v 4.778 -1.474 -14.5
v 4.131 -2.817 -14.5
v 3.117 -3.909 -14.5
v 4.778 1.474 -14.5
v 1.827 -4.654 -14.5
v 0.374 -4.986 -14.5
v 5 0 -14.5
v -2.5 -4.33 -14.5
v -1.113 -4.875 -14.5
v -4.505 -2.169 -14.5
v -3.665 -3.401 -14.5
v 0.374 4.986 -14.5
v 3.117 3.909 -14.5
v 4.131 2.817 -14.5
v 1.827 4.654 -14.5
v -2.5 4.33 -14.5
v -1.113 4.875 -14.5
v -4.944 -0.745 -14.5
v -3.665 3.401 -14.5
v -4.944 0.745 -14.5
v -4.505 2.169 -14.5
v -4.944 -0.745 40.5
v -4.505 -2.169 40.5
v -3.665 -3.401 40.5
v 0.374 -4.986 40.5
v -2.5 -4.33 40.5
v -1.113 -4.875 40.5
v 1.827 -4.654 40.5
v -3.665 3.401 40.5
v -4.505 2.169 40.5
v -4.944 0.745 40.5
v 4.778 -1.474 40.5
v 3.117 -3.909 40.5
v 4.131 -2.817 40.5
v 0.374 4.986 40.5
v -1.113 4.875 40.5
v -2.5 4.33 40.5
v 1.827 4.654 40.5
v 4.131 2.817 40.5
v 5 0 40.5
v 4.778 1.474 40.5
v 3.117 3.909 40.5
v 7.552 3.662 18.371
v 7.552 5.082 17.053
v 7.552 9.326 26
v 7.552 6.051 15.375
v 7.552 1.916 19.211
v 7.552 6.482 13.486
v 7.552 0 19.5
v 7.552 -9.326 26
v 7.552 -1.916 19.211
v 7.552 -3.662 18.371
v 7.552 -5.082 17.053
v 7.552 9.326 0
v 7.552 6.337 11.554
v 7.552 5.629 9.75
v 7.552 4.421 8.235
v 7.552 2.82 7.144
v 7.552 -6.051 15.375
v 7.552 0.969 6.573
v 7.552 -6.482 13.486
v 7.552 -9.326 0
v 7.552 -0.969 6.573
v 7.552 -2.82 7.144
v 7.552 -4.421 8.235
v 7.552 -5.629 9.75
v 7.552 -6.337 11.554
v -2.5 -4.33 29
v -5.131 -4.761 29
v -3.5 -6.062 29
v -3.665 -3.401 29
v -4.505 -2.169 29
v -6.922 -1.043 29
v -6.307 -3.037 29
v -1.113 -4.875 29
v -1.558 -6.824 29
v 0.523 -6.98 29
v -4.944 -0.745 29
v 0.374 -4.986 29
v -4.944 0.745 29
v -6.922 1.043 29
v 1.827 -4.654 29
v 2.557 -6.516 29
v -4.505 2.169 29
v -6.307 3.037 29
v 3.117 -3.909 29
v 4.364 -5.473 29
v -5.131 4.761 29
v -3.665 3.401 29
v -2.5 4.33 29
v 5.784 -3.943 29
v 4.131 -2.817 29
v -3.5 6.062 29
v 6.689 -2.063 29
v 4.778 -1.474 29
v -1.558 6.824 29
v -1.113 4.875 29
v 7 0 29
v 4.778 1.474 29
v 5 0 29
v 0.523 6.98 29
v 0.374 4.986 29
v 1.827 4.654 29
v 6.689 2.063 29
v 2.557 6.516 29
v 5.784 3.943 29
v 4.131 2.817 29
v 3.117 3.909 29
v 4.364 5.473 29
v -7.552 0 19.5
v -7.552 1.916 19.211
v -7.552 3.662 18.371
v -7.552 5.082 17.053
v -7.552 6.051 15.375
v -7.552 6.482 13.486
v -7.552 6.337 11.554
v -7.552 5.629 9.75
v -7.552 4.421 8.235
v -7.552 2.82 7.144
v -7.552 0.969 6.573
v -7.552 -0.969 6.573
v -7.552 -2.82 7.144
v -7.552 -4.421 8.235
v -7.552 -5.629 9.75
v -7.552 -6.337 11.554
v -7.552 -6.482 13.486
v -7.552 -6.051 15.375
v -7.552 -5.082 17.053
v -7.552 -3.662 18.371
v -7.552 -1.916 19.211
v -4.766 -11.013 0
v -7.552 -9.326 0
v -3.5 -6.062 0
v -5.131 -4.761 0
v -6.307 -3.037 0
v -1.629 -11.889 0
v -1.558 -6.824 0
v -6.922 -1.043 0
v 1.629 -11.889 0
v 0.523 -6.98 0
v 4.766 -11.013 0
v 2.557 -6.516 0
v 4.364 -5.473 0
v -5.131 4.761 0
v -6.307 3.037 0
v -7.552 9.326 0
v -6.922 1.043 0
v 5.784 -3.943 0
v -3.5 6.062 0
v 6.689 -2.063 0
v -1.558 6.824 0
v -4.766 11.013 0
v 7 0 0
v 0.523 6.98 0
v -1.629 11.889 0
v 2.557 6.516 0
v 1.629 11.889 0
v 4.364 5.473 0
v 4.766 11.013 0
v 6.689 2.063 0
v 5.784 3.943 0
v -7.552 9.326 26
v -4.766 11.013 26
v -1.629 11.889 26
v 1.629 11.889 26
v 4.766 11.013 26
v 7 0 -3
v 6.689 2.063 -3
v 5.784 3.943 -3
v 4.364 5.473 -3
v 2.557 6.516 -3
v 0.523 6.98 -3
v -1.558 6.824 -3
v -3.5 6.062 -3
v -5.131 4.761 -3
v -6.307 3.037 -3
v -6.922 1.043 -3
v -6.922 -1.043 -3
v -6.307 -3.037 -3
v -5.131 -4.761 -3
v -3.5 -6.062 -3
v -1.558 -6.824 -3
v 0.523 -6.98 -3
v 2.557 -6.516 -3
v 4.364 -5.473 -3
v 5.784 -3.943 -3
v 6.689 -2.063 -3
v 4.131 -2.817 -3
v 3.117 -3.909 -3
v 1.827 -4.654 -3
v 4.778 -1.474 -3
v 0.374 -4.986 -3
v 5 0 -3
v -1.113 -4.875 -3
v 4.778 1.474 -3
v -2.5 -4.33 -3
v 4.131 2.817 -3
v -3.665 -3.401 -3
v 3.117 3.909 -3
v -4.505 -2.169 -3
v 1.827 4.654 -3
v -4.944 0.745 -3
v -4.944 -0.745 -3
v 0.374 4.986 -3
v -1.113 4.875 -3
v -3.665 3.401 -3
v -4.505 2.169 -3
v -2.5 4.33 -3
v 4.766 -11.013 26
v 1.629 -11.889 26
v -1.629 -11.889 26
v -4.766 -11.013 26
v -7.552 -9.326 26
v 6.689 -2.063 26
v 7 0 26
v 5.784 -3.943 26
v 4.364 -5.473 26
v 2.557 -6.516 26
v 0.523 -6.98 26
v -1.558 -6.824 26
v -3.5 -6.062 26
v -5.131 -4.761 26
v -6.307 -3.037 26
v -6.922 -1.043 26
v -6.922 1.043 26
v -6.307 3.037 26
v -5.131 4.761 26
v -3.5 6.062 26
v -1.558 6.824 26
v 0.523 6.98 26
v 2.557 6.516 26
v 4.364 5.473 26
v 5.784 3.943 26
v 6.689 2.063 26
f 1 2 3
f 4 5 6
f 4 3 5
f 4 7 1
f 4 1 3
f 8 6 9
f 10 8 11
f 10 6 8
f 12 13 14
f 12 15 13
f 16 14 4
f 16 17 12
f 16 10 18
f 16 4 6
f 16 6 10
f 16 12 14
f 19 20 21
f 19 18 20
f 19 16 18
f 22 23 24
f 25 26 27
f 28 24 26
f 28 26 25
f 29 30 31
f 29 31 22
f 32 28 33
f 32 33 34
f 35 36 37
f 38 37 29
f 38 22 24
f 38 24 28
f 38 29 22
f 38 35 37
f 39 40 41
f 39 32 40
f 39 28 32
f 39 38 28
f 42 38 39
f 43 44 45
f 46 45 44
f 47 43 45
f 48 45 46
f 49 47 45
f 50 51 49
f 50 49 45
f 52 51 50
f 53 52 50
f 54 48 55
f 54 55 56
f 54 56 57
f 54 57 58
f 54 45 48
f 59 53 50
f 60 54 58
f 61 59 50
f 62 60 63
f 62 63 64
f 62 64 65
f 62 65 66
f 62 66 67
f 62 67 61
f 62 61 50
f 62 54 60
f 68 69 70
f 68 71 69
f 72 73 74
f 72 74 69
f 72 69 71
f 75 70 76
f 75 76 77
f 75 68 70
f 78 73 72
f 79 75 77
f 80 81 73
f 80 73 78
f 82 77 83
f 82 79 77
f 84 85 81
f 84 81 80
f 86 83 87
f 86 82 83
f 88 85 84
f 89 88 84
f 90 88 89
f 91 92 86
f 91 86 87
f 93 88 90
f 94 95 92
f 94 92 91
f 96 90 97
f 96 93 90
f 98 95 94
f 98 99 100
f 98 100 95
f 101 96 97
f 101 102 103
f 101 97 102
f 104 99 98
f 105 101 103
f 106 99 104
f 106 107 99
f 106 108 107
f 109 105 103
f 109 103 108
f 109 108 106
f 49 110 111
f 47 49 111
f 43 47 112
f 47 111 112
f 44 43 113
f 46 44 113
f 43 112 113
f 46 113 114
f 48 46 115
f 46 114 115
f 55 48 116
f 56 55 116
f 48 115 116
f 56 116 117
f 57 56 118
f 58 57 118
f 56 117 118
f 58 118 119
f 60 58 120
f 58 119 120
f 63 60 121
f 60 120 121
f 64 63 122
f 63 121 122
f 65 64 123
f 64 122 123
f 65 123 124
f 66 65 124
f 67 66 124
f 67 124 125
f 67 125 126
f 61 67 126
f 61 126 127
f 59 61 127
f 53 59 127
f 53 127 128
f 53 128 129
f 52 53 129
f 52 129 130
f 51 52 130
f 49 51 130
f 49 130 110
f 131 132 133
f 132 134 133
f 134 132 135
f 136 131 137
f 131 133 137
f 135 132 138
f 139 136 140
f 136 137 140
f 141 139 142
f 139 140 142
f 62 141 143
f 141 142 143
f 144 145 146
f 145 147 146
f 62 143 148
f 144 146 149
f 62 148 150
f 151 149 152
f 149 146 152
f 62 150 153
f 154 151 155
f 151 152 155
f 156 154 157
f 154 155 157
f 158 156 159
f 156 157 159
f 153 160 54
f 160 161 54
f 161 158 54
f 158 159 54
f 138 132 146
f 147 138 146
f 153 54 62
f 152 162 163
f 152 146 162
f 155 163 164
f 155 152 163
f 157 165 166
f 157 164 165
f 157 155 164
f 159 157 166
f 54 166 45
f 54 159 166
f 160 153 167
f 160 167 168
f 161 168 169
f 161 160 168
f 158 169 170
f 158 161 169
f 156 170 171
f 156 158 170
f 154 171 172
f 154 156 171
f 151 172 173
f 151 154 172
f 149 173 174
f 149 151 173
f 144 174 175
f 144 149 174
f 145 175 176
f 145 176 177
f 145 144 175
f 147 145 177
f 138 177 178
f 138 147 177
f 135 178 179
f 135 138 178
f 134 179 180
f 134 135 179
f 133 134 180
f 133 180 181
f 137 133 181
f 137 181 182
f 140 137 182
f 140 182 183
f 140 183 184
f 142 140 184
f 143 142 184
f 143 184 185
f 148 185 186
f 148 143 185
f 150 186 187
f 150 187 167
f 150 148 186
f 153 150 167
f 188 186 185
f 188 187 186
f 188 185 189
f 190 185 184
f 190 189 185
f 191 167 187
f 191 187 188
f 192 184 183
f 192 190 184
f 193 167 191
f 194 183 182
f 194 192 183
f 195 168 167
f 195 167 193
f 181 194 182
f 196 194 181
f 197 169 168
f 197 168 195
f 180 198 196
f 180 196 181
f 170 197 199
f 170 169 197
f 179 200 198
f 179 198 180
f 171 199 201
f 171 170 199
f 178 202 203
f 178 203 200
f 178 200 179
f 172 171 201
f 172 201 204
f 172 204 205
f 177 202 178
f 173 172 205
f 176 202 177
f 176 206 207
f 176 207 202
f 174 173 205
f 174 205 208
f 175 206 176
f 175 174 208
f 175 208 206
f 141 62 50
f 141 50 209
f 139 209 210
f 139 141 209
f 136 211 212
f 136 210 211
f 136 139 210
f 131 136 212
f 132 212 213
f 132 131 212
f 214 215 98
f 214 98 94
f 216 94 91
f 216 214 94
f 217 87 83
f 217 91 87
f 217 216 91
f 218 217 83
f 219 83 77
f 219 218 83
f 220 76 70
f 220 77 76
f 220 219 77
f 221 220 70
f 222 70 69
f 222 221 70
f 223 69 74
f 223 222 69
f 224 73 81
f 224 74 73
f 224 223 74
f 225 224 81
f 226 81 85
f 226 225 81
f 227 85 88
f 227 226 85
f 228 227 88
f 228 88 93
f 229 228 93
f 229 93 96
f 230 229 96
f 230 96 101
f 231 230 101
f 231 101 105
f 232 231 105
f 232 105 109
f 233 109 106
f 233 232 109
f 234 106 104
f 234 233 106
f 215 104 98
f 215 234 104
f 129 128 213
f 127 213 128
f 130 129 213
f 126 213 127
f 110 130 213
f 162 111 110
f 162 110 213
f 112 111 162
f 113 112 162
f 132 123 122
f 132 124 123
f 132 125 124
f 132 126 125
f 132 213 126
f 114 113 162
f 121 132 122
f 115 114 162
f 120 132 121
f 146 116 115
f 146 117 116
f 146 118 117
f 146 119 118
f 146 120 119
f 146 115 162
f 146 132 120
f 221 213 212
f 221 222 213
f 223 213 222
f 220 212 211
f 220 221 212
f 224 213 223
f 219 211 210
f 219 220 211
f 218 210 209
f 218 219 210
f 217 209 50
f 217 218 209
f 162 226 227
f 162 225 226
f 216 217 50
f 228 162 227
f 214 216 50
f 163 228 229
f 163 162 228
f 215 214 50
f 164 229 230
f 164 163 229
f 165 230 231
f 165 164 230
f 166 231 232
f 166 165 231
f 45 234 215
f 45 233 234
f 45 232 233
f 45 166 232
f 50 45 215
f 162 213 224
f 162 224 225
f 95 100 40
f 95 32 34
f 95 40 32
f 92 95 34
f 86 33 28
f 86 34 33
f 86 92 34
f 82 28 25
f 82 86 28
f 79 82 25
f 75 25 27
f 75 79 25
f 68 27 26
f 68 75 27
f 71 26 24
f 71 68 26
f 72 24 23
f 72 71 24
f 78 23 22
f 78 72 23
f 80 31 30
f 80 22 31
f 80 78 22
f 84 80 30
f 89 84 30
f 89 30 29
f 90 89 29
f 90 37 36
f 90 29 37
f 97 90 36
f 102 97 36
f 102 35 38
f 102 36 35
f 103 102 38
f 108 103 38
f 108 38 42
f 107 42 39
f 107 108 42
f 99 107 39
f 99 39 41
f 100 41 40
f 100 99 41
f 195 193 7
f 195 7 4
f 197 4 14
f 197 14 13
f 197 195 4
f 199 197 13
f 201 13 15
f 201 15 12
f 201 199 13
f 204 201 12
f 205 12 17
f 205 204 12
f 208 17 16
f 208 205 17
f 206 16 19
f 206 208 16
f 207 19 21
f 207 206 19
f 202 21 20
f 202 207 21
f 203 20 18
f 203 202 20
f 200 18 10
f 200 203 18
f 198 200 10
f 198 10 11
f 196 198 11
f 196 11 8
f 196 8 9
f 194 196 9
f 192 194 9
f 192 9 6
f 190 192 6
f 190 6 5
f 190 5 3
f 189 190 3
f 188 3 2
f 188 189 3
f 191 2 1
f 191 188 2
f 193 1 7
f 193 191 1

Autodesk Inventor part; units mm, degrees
ref_plane "YZ Plane" through (0, 0, 0) normal (1, 0, 0) x (0, 1, 0)
ref_plane "XZ Plane" through (0, 0, 0) normal (0, 1, 0) x (-1, 0, 0)
sketch "Sketch1" plane through (0, 0, 0) normal (0, 0, 1) x (1, 0, 0)
  line L0 (7.5517, 9.3259) -> (7.5517, -9.3259)
  line L1 (-7.5517, -9.3259) -> (-7.5517, 9.3259)
  line L2 (-7.5517, 9.3259) -> (7.5517, -9.3259) construction
  line L3 (7.5517, 9.3259) -> (-7.5517, -9.3259) construction
  arc A0 (-7.5517, -9.3259) -> (7.5517, -9.3259) centre (0, 0) ccw
  arc A1 (7.5517, 9.3259) -> (-7.5517, 9.3259) centre (0, 0) ccw
extrude "Extrusion1" add sketch "Sketch1" along normal blind 26
sketch "Sketch2" plane through (0, 0, 26) normal (0, 0, 1) x (1, 0, 0)
  circle A0 centre (0, 0) radius 7
  dimension "d3" = 14
extrude "Extrusion2" add sketch "Sketch2" along normal blind 3
sketch "Sketch3" plane through (0, 0, 29) normal (0, 0, 1) x (1, 0, 0)
  circle A0 centre (0, 0) radius 5
  dimension "d6" = 10
extrude "Extrusion3" add sketch "Sketch3" along normal blind 11.5
ref_plane "Work Plane1" through (0, 0, 13) normal (0, 0, 1) x (1, 0, 0)
mirror "Mirror1" about plane through (0, 0, 13) normal (0, 0, 1) of "Extrusion3", "Extrusion2"
sketch "Sketch4" plane through (-7.5517, -9.3259, 0) normal (-1, 0, 0) x (0, 0, 1)
  circle A0 centre (13, 9.3259) radius 6.5
  point P0 (0, 9.3259)
  dimension "d9" = 13
extrude "Extrusion4" cut sketch "Sketch4" against normal blind 100
thread "Thread1" size "M10x1.5" class "6g" standard "ANSI Metric M Profile" length 13
thread "Thread2" size "M10x1.5" class "6g" standard "ISO Metric profile" length 13
